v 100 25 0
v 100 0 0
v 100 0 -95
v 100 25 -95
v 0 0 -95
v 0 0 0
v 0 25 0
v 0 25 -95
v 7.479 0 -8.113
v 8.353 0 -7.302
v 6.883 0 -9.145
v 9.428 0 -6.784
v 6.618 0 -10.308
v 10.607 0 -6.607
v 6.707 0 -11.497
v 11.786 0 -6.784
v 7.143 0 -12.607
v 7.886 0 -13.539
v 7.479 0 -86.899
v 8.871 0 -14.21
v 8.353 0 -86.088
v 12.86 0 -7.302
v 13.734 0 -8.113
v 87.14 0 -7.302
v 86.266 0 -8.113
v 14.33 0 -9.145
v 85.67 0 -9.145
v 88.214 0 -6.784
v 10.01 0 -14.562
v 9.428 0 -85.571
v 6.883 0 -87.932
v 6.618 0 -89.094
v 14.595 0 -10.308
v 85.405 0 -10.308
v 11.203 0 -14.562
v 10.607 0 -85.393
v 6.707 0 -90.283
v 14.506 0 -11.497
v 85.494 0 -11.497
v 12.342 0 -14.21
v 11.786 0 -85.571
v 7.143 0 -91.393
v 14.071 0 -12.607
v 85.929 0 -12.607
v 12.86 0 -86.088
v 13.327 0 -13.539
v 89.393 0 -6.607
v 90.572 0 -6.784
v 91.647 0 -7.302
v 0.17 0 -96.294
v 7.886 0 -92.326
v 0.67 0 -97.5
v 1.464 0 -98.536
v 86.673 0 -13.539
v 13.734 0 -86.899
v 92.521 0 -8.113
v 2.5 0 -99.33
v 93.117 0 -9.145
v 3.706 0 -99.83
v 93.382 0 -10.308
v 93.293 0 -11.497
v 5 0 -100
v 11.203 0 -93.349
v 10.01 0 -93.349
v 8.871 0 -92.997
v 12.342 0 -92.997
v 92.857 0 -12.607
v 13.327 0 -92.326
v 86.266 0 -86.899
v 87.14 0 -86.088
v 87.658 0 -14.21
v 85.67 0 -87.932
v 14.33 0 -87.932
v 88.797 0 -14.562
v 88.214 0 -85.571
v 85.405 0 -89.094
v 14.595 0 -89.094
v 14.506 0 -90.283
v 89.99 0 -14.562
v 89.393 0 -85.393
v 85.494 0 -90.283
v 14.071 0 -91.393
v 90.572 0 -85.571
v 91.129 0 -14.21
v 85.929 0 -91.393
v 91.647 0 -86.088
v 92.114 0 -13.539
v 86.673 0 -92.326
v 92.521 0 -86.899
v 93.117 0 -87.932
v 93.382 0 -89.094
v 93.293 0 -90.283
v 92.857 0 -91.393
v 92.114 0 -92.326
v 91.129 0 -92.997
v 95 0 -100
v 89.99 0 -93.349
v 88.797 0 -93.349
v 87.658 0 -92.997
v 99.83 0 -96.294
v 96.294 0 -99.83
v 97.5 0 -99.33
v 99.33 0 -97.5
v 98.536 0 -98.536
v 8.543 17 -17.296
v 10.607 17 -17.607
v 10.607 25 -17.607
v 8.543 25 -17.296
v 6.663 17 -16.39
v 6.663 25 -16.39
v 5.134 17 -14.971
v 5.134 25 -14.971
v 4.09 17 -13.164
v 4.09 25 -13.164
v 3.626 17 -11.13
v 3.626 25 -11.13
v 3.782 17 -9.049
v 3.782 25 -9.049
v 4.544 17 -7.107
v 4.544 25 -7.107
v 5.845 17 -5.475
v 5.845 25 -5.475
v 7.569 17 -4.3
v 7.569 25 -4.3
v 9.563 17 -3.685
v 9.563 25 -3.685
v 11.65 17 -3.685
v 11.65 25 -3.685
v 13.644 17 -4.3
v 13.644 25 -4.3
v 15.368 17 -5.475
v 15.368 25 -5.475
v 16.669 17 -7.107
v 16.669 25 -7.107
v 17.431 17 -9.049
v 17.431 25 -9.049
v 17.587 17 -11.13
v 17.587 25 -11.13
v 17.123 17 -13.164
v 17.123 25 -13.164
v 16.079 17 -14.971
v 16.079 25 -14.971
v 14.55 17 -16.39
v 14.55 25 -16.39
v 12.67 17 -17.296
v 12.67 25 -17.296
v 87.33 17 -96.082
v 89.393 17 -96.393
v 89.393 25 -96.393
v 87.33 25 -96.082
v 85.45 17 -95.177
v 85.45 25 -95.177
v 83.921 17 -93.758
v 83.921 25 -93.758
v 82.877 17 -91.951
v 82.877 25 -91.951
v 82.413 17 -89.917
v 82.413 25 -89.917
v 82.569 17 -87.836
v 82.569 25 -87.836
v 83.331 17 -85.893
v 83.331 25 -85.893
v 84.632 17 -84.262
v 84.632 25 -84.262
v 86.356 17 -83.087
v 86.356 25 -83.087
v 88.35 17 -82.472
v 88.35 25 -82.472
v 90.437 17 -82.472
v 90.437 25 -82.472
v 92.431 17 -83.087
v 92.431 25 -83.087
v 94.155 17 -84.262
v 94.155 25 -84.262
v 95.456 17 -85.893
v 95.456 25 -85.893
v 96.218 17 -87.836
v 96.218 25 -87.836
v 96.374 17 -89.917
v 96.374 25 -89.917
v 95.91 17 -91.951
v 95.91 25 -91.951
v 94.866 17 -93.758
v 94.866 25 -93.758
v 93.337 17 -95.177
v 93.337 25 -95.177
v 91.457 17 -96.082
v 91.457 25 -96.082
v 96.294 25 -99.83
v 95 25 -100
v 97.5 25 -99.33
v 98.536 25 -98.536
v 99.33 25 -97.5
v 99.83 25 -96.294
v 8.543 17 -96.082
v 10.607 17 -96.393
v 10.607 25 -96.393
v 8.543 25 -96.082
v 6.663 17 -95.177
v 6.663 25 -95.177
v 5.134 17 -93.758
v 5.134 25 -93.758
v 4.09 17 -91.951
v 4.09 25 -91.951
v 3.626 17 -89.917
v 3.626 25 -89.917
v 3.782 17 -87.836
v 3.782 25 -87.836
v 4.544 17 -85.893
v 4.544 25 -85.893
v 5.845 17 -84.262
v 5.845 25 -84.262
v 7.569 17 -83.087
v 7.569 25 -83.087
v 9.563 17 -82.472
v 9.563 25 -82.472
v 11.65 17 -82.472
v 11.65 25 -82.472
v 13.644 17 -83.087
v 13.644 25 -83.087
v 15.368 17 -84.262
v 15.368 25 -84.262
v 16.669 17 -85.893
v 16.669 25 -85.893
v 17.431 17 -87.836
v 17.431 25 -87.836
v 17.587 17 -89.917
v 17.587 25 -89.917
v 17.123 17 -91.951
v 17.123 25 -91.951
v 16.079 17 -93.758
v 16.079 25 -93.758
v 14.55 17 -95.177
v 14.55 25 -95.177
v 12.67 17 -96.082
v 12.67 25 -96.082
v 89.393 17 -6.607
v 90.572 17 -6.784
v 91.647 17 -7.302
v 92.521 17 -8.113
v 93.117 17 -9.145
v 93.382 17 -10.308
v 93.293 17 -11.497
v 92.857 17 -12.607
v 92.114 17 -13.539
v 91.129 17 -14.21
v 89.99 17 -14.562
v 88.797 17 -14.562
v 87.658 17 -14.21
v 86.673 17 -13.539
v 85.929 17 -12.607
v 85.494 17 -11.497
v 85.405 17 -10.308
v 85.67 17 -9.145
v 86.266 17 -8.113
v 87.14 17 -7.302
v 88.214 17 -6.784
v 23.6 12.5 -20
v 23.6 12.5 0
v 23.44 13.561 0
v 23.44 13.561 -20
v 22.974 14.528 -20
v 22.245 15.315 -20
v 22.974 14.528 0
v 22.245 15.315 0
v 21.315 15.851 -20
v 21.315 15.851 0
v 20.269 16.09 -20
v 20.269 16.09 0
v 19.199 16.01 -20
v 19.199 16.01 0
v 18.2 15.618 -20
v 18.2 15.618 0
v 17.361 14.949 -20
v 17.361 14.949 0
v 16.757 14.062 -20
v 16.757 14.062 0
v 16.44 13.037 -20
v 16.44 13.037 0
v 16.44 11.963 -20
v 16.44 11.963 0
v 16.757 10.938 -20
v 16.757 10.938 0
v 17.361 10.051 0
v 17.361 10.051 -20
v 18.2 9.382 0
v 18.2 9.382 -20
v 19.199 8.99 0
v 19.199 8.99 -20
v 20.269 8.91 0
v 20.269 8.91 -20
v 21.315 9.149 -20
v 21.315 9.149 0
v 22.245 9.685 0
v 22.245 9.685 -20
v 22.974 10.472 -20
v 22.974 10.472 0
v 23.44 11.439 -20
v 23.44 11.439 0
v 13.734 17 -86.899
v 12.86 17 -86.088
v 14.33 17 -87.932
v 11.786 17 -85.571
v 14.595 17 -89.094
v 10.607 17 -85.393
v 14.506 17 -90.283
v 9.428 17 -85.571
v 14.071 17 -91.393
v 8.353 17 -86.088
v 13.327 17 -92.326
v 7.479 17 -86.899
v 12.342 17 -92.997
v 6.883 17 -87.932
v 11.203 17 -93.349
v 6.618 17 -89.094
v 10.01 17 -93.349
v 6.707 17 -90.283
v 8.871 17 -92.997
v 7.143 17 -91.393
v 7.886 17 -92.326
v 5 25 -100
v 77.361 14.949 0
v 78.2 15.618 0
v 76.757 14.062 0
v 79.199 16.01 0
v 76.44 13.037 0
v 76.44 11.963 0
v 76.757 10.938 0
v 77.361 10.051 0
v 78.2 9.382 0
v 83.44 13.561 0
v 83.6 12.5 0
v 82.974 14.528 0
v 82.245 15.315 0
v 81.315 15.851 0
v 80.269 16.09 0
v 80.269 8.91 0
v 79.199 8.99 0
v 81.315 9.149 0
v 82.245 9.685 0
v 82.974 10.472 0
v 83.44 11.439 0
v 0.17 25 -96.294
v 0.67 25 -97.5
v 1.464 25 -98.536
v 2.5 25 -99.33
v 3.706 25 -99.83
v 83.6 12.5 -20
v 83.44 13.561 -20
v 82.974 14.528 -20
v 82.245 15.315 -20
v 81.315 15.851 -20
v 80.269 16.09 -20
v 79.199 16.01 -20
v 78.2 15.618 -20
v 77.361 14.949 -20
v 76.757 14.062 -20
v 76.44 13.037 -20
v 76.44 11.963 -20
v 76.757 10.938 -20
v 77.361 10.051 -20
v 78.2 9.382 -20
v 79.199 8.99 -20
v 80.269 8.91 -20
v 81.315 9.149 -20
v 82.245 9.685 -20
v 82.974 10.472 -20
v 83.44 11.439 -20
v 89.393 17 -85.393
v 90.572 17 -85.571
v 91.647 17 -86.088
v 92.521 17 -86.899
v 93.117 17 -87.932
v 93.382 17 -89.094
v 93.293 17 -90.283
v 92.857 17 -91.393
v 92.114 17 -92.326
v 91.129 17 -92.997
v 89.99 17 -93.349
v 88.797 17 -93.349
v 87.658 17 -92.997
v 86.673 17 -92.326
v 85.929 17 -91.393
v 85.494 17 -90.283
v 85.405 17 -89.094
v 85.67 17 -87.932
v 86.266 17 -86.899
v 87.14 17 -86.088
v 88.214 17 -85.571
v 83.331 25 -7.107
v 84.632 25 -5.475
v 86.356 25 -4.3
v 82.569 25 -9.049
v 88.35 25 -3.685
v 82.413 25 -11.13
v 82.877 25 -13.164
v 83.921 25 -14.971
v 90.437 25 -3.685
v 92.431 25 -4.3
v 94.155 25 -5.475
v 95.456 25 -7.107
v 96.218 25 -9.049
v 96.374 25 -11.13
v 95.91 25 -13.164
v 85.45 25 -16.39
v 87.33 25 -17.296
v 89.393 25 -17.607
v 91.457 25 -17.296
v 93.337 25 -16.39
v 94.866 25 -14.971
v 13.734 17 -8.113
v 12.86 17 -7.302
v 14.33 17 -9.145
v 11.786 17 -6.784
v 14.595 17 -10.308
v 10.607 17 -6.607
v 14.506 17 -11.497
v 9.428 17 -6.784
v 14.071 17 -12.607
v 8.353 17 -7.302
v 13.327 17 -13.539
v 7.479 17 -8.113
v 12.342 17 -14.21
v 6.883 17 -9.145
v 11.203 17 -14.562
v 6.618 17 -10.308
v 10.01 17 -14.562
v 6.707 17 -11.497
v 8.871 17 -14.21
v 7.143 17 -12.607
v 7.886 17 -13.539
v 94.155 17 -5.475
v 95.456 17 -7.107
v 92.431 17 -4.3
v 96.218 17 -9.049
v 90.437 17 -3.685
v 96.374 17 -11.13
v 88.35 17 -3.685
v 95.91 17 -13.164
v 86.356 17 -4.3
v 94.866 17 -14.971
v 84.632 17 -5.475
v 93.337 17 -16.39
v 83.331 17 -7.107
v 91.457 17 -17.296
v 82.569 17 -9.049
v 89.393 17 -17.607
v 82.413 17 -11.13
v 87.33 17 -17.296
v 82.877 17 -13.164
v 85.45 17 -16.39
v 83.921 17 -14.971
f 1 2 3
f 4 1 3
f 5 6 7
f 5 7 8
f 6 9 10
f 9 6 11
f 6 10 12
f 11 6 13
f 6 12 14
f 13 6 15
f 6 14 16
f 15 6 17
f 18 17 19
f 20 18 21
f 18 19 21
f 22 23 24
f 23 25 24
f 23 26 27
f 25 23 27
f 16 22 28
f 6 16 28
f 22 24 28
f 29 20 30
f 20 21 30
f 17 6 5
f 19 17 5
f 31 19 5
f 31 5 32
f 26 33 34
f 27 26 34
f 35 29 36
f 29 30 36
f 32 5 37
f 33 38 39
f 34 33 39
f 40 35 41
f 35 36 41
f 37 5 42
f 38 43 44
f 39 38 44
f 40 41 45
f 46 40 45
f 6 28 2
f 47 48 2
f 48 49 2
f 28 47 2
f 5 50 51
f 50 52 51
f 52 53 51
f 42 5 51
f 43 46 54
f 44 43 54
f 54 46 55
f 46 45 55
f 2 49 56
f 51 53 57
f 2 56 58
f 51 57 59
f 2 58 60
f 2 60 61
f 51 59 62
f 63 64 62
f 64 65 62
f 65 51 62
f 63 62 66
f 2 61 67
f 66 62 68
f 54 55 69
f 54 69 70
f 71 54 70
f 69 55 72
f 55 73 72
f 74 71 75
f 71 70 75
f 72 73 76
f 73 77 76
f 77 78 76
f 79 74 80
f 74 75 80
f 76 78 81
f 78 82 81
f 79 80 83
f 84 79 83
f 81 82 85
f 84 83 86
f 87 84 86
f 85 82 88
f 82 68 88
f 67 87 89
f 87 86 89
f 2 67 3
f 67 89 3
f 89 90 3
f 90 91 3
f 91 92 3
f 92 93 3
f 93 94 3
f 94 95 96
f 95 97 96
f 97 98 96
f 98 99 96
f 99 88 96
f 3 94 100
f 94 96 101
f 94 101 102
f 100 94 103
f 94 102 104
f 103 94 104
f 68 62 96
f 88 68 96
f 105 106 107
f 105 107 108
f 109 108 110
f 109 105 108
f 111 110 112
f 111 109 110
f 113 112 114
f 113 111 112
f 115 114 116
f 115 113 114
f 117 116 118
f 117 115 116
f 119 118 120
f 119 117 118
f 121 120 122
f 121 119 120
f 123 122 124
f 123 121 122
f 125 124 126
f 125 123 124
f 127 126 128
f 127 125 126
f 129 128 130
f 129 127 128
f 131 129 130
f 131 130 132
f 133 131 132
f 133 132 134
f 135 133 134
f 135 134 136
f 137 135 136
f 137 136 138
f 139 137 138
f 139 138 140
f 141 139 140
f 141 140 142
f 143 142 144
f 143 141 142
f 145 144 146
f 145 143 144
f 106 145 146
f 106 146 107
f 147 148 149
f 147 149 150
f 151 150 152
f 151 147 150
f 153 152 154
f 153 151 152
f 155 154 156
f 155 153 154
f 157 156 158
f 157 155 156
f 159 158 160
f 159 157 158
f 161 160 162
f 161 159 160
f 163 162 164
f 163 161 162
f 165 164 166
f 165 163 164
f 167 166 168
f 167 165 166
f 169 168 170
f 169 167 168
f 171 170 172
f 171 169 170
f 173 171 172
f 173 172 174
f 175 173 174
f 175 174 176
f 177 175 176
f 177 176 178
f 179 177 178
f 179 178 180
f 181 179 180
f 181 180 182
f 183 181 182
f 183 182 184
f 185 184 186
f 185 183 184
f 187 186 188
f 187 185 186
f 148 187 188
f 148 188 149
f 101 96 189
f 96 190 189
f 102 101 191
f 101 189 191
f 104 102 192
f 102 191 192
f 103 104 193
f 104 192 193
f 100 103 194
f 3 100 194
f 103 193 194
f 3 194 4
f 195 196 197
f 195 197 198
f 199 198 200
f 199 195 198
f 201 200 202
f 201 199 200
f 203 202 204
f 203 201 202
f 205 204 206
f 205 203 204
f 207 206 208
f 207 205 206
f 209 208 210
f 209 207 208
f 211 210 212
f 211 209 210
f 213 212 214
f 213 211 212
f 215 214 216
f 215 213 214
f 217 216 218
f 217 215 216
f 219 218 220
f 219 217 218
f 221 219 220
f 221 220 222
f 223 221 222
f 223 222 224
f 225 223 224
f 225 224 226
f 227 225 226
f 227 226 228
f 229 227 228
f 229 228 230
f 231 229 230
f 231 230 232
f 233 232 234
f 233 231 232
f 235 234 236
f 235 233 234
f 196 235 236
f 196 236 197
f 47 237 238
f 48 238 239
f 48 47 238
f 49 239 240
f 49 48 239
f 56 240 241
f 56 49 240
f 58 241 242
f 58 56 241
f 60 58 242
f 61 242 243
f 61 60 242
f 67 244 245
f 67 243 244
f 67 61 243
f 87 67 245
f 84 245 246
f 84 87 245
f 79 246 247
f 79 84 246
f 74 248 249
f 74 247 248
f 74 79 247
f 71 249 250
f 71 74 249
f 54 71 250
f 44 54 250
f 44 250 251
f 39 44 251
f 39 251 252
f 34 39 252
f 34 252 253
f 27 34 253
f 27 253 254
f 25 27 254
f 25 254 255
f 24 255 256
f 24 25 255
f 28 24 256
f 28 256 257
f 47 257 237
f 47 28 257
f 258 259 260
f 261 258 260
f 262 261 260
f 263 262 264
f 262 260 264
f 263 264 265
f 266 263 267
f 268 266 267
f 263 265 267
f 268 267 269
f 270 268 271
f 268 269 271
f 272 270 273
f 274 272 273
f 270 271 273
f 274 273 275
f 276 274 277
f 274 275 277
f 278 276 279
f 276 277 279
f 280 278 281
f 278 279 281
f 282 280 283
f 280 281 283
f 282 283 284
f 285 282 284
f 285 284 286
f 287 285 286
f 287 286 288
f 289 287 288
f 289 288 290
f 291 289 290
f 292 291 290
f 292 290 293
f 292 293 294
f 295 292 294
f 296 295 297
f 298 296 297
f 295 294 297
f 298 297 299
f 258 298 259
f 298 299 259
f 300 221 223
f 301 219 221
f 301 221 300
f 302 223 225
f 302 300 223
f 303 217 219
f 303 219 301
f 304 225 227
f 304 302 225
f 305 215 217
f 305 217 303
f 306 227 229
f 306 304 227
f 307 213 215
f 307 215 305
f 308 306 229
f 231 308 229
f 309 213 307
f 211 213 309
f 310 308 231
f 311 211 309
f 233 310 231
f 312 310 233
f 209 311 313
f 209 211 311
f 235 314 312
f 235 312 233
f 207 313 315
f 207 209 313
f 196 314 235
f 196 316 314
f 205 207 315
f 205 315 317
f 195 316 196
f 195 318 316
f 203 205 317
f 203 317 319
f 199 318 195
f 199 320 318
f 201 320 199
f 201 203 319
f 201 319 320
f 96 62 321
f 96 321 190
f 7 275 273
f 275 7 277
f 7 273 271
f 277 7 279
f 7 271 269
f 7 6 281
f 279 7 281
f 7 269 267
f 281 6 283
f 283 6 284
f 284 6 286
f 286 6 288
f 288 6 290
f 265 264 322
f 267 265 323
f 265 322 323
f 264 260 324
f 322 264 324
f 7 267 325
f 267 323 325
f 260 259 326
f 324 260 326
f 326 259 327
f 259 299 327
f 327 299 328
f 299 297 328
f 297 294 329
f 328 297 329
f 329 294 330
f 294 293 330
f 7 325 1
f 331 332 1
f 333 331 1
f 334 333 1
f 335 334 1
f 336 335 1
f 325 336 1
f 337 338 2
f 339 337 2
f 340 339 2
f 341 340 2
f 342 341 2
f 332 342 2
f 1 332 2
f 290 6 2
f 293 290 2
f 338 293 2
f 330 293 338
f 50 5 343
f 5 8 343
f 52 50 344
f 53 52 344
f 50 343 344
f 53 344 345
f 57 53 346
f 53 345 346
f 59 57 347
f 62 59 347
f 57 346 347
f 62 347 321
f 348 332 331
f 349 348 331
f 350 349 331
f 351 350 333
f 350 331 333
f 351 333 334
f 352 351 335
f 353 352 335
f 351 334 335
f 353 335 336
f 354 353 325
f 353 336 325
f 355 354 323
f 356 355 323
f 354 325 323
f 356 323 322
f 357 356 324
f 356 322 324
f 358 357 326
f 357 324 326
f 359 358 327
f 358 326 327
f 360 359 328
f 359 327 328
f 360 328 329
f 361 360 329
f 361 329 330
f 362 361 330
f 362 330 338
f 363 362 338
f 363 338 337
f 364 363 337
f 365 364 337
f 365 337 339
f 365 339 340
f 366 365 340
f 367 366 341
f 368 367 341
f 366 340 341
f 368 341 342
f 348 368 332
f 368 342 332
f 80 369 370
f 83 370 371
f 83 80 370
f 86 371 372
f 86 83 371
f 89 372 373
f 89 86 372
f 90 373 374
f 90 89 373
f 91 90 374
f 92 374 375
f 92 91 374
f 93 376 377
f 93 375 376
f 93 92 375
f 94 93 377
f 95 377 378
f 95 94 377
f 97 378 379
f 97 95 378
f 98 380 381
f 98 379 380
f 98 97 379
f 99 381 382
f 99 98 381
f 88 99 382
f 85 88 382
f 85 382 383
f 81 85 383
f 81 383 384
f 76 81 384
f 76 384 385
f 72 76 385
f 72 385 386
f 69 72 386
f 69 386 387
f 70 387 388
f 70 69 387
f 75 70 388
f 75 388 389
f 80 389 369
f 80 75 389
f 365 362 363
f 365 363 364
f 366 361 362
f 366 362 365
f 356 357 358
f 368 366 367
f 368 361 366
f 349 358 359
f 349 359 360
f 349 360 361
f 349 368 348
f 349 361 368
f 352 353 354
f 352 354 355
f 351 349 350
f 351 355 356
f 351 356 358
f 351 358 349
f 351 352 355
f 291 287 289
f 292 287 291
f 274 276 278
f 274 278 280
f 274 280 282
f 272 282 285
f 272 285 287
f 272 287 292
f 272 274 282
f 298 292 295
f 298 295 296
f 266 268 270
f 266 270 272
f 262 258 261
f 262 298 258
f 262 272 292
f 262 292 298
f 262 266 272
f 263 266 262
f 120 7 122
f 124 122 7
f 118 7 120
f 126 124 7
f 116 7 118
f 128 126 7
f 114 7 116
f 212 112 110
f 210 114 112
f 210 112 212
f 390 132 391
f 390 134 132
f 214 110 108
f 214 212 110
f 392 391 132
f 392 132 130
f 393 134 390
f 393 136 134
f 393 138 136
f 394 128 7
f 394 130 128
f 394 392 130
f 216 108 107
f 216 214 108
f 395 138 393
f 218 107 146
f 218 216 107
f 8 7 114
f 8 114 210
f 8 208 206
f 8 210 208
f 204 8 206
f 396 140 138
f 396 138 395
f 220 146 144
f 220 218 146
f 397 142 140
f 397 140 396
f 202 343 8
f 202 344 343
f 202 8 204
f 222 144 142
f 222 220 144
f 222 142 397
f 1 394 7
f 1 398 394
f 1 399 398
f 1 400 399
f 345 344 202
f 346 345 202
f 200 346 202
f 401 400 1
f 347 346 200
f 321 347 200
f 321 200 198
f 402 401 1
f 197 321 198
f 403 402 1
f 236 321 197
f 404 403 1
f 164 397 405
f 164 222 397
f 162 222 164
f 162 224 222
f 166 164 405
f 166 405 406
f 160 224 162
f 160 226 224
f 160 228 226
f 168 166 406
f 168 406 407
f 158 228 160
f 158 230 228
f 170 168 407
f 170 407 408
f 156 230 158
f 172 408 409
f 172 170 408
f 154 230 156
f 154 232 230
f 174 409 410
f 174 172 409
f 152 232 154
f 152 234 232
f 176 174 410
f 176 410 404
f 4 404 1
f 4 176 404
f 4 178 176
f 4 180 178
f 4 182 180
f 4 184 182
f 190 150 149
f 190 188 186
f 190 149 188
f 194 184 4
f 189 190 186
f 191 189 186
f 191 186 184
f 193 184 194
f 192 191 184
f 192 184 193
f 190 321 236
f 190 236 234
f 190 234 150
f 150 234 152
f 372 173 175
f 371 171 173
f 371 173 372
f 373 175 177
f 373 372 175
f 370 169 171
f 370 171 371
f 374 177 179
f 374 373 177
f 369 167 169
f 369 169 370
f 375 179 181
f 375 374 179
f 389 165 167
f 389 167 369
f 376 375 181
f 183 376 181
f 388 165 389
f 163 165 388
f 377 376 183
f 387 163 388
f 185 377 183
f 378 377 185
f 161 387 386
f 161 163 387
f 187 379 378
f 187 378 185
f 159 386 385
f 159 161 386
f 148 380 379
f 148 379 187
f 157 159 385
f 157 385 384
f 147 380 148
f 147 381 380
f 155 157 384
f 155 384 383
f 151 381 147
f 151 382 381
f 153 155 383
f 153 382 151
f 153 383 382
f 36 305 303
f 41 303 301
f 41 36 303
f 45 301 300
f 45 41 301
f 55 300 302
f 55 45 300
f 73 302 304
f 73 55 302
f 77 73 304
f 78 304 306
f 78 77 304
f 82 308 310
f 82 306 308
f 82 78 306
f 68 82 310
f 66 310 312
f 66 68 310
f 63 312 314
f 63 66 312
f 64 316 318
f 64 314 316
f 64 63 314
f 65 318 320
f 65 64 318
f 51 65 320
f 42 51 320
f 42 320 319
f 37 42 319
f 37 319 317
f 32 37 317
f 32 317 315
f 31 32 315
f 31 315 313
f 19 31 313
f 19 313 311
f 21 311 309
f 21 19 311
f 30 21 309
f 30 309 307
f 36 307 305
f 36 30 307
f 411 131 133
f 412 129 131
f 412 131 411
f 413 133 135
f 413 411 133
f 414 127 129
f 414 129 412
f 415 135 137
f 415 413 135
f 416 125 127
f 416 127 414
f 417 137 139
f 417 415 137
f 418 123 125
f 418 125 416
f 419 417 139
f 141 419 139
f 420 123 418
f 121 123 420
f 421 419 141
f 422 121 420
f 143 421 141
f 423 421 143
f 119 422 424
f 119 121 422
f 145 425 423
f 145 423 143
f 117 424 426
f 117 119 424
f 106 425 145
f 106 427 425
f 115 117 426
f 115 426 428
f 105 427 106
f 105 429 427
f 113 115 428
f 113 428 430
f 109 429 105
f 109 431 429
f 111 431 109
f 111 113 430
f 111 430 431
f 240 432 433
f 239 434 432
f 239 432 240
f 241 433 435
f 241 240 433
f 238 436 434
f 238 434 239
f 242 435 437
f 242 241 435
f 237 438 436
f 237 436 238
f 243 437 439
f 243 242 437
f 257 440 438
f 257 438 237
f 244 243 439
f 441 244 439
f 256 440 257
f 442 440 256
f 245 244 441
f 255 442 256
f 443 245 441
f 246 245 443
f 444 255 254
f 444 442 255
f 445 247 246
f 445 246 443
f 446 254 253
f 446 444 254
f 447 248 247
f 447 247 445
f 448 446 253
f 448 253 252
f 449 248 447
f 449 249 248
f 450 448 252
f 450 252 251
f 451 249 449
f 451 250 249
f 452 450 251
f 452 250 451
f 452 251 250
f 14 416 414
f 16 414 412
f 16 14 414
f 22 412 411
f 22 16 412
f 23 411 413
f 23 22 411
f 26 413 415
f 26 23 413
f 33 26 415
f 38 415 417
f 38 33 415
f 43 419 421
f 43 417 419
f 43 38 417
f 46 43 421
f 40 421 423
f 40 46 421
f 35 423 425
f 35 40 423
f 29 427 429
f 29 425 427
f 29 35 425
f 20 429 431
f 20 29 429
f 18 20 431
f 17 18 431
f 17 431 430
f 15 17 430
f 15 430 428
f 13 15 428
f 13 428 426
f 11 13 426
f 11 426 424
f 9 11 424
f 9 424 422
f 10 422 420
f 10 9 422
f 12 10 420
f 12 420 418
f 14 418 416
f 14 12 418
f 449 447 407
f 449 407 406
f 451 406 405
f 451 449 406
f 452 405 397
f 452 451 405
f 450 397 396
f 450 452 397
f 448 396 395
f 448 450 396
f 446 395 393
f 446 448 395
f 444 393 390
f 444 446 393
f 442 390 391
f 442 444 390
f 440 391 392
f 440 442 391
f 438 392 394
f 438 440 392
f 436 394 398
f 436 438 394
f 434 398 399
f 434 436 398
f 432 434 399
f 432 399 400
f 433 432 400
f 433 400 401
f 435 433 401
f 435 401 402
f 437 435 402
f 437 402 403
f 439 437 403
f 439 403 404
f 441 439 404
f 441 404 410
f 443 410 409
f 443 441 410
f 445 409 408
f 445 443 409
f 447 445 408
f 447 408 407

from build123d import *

# Parameters (mm, degrees)
SKETCH1_W           = 100
SKETCH1_H           = 100
SKETCH1_R           = 4
BOSS_EXTRUDE1_DEPTH = 25
SKETCH2_R           = 3.6
CUT_EXTRUDE1_DEPTH  = 20
FILLET1_R           = 5
CUT_EXTRUDE3_START  = 17
SKETCH1_3_R         = 7
CUT_EXTRUDE3_DEPTH  = 8


with BuildPart() as part:
    # Sketch1 → Boss-Extrude1 (new body)
    with BuildSketch(Plane(origin=(0, 0, 0), x_dir=(1, 0, 0), z_dir=(0, 1, 0))):
        with Locations((50, 50)):
            Rectangle(SKETCH1_W, SKETCH1_H)
        with Locations(Location((10.606601718, 89.393398282, 0), (0, 0, 270))):
            Circle(SKETCH1_R, mode=Mode.SUBTRACT)
        with Locations(Location((89.393398282, 89.393398282, 0), (0, 0, 270))):
            Circle(SKETCH1_R, mode=Mode.SUBTRACT)
        with Locations(Location((89.393398282, 10.606601718, 0), (0, 0, 270))):
            Circle(SKETCH1_R, mode=Mode.SUBTRACT)
        with Locations(Location((10.606601718, 10.606601718, 0), (0, 0, 270))):
            Circle(SKETCH1_R, mode=Mode.SUBTRACT)
    extrude(amount=BOSS_EXTRUDE1_DEPTH)

    # Sketch2 → Cut-Extrude1 (cut)
    with BuildSketch(Plane.XY):
        with Locations((20, 12.5)):
            Circle(SKETCH2_R)
        with Locations((80, 12.5)):
            Circle(SKETCH2_R)
    extrude(amount=-CUT_EXTRUDE1_DEPTH, mode=Mode.SUBTRACT)

    # Fillet1
    fillet1_edges = [part.edges().sort_by_distance(p)[0] for p in [
        (100, 12.5, -100),
        (0, 12.5, -100),
    ]]
    fillet(fillet1_edges, radius=FILLET1_R)

    # Sketch1<3> → Cut-Extrude3 (cut)
    with BuildSketch(Plane(origin=(0, 0, 0), x_dir=(1, 0, 0), z_dir=(0, 1, 0)).offset(CUT_EXTRUDE3_START)):
        with Locations(Location((10.606601718, 89.393398282, 0), (0, 0, 90))):
            Circle(SKETCH1_3_R)
        with Locations(Location((89.393398282, 89.393398282, 0), (0, 0, 90))):
            Circle(SKETCH1_3_R)
        with Locations(Location((10.606601718, 10.606601718, 0), (0, 0, 90))):
            Circle(SKETCH1_3_R)
        with Locations(Location((89.393398282, 10.606601718, 0), (0, 0, 90))):
            Circle(SKETCH1_3_R)
    extrude(amount=CUT_EXTRUDE3_DEPTH, mode=Mode.SUBTRACT)


solid = part.part
